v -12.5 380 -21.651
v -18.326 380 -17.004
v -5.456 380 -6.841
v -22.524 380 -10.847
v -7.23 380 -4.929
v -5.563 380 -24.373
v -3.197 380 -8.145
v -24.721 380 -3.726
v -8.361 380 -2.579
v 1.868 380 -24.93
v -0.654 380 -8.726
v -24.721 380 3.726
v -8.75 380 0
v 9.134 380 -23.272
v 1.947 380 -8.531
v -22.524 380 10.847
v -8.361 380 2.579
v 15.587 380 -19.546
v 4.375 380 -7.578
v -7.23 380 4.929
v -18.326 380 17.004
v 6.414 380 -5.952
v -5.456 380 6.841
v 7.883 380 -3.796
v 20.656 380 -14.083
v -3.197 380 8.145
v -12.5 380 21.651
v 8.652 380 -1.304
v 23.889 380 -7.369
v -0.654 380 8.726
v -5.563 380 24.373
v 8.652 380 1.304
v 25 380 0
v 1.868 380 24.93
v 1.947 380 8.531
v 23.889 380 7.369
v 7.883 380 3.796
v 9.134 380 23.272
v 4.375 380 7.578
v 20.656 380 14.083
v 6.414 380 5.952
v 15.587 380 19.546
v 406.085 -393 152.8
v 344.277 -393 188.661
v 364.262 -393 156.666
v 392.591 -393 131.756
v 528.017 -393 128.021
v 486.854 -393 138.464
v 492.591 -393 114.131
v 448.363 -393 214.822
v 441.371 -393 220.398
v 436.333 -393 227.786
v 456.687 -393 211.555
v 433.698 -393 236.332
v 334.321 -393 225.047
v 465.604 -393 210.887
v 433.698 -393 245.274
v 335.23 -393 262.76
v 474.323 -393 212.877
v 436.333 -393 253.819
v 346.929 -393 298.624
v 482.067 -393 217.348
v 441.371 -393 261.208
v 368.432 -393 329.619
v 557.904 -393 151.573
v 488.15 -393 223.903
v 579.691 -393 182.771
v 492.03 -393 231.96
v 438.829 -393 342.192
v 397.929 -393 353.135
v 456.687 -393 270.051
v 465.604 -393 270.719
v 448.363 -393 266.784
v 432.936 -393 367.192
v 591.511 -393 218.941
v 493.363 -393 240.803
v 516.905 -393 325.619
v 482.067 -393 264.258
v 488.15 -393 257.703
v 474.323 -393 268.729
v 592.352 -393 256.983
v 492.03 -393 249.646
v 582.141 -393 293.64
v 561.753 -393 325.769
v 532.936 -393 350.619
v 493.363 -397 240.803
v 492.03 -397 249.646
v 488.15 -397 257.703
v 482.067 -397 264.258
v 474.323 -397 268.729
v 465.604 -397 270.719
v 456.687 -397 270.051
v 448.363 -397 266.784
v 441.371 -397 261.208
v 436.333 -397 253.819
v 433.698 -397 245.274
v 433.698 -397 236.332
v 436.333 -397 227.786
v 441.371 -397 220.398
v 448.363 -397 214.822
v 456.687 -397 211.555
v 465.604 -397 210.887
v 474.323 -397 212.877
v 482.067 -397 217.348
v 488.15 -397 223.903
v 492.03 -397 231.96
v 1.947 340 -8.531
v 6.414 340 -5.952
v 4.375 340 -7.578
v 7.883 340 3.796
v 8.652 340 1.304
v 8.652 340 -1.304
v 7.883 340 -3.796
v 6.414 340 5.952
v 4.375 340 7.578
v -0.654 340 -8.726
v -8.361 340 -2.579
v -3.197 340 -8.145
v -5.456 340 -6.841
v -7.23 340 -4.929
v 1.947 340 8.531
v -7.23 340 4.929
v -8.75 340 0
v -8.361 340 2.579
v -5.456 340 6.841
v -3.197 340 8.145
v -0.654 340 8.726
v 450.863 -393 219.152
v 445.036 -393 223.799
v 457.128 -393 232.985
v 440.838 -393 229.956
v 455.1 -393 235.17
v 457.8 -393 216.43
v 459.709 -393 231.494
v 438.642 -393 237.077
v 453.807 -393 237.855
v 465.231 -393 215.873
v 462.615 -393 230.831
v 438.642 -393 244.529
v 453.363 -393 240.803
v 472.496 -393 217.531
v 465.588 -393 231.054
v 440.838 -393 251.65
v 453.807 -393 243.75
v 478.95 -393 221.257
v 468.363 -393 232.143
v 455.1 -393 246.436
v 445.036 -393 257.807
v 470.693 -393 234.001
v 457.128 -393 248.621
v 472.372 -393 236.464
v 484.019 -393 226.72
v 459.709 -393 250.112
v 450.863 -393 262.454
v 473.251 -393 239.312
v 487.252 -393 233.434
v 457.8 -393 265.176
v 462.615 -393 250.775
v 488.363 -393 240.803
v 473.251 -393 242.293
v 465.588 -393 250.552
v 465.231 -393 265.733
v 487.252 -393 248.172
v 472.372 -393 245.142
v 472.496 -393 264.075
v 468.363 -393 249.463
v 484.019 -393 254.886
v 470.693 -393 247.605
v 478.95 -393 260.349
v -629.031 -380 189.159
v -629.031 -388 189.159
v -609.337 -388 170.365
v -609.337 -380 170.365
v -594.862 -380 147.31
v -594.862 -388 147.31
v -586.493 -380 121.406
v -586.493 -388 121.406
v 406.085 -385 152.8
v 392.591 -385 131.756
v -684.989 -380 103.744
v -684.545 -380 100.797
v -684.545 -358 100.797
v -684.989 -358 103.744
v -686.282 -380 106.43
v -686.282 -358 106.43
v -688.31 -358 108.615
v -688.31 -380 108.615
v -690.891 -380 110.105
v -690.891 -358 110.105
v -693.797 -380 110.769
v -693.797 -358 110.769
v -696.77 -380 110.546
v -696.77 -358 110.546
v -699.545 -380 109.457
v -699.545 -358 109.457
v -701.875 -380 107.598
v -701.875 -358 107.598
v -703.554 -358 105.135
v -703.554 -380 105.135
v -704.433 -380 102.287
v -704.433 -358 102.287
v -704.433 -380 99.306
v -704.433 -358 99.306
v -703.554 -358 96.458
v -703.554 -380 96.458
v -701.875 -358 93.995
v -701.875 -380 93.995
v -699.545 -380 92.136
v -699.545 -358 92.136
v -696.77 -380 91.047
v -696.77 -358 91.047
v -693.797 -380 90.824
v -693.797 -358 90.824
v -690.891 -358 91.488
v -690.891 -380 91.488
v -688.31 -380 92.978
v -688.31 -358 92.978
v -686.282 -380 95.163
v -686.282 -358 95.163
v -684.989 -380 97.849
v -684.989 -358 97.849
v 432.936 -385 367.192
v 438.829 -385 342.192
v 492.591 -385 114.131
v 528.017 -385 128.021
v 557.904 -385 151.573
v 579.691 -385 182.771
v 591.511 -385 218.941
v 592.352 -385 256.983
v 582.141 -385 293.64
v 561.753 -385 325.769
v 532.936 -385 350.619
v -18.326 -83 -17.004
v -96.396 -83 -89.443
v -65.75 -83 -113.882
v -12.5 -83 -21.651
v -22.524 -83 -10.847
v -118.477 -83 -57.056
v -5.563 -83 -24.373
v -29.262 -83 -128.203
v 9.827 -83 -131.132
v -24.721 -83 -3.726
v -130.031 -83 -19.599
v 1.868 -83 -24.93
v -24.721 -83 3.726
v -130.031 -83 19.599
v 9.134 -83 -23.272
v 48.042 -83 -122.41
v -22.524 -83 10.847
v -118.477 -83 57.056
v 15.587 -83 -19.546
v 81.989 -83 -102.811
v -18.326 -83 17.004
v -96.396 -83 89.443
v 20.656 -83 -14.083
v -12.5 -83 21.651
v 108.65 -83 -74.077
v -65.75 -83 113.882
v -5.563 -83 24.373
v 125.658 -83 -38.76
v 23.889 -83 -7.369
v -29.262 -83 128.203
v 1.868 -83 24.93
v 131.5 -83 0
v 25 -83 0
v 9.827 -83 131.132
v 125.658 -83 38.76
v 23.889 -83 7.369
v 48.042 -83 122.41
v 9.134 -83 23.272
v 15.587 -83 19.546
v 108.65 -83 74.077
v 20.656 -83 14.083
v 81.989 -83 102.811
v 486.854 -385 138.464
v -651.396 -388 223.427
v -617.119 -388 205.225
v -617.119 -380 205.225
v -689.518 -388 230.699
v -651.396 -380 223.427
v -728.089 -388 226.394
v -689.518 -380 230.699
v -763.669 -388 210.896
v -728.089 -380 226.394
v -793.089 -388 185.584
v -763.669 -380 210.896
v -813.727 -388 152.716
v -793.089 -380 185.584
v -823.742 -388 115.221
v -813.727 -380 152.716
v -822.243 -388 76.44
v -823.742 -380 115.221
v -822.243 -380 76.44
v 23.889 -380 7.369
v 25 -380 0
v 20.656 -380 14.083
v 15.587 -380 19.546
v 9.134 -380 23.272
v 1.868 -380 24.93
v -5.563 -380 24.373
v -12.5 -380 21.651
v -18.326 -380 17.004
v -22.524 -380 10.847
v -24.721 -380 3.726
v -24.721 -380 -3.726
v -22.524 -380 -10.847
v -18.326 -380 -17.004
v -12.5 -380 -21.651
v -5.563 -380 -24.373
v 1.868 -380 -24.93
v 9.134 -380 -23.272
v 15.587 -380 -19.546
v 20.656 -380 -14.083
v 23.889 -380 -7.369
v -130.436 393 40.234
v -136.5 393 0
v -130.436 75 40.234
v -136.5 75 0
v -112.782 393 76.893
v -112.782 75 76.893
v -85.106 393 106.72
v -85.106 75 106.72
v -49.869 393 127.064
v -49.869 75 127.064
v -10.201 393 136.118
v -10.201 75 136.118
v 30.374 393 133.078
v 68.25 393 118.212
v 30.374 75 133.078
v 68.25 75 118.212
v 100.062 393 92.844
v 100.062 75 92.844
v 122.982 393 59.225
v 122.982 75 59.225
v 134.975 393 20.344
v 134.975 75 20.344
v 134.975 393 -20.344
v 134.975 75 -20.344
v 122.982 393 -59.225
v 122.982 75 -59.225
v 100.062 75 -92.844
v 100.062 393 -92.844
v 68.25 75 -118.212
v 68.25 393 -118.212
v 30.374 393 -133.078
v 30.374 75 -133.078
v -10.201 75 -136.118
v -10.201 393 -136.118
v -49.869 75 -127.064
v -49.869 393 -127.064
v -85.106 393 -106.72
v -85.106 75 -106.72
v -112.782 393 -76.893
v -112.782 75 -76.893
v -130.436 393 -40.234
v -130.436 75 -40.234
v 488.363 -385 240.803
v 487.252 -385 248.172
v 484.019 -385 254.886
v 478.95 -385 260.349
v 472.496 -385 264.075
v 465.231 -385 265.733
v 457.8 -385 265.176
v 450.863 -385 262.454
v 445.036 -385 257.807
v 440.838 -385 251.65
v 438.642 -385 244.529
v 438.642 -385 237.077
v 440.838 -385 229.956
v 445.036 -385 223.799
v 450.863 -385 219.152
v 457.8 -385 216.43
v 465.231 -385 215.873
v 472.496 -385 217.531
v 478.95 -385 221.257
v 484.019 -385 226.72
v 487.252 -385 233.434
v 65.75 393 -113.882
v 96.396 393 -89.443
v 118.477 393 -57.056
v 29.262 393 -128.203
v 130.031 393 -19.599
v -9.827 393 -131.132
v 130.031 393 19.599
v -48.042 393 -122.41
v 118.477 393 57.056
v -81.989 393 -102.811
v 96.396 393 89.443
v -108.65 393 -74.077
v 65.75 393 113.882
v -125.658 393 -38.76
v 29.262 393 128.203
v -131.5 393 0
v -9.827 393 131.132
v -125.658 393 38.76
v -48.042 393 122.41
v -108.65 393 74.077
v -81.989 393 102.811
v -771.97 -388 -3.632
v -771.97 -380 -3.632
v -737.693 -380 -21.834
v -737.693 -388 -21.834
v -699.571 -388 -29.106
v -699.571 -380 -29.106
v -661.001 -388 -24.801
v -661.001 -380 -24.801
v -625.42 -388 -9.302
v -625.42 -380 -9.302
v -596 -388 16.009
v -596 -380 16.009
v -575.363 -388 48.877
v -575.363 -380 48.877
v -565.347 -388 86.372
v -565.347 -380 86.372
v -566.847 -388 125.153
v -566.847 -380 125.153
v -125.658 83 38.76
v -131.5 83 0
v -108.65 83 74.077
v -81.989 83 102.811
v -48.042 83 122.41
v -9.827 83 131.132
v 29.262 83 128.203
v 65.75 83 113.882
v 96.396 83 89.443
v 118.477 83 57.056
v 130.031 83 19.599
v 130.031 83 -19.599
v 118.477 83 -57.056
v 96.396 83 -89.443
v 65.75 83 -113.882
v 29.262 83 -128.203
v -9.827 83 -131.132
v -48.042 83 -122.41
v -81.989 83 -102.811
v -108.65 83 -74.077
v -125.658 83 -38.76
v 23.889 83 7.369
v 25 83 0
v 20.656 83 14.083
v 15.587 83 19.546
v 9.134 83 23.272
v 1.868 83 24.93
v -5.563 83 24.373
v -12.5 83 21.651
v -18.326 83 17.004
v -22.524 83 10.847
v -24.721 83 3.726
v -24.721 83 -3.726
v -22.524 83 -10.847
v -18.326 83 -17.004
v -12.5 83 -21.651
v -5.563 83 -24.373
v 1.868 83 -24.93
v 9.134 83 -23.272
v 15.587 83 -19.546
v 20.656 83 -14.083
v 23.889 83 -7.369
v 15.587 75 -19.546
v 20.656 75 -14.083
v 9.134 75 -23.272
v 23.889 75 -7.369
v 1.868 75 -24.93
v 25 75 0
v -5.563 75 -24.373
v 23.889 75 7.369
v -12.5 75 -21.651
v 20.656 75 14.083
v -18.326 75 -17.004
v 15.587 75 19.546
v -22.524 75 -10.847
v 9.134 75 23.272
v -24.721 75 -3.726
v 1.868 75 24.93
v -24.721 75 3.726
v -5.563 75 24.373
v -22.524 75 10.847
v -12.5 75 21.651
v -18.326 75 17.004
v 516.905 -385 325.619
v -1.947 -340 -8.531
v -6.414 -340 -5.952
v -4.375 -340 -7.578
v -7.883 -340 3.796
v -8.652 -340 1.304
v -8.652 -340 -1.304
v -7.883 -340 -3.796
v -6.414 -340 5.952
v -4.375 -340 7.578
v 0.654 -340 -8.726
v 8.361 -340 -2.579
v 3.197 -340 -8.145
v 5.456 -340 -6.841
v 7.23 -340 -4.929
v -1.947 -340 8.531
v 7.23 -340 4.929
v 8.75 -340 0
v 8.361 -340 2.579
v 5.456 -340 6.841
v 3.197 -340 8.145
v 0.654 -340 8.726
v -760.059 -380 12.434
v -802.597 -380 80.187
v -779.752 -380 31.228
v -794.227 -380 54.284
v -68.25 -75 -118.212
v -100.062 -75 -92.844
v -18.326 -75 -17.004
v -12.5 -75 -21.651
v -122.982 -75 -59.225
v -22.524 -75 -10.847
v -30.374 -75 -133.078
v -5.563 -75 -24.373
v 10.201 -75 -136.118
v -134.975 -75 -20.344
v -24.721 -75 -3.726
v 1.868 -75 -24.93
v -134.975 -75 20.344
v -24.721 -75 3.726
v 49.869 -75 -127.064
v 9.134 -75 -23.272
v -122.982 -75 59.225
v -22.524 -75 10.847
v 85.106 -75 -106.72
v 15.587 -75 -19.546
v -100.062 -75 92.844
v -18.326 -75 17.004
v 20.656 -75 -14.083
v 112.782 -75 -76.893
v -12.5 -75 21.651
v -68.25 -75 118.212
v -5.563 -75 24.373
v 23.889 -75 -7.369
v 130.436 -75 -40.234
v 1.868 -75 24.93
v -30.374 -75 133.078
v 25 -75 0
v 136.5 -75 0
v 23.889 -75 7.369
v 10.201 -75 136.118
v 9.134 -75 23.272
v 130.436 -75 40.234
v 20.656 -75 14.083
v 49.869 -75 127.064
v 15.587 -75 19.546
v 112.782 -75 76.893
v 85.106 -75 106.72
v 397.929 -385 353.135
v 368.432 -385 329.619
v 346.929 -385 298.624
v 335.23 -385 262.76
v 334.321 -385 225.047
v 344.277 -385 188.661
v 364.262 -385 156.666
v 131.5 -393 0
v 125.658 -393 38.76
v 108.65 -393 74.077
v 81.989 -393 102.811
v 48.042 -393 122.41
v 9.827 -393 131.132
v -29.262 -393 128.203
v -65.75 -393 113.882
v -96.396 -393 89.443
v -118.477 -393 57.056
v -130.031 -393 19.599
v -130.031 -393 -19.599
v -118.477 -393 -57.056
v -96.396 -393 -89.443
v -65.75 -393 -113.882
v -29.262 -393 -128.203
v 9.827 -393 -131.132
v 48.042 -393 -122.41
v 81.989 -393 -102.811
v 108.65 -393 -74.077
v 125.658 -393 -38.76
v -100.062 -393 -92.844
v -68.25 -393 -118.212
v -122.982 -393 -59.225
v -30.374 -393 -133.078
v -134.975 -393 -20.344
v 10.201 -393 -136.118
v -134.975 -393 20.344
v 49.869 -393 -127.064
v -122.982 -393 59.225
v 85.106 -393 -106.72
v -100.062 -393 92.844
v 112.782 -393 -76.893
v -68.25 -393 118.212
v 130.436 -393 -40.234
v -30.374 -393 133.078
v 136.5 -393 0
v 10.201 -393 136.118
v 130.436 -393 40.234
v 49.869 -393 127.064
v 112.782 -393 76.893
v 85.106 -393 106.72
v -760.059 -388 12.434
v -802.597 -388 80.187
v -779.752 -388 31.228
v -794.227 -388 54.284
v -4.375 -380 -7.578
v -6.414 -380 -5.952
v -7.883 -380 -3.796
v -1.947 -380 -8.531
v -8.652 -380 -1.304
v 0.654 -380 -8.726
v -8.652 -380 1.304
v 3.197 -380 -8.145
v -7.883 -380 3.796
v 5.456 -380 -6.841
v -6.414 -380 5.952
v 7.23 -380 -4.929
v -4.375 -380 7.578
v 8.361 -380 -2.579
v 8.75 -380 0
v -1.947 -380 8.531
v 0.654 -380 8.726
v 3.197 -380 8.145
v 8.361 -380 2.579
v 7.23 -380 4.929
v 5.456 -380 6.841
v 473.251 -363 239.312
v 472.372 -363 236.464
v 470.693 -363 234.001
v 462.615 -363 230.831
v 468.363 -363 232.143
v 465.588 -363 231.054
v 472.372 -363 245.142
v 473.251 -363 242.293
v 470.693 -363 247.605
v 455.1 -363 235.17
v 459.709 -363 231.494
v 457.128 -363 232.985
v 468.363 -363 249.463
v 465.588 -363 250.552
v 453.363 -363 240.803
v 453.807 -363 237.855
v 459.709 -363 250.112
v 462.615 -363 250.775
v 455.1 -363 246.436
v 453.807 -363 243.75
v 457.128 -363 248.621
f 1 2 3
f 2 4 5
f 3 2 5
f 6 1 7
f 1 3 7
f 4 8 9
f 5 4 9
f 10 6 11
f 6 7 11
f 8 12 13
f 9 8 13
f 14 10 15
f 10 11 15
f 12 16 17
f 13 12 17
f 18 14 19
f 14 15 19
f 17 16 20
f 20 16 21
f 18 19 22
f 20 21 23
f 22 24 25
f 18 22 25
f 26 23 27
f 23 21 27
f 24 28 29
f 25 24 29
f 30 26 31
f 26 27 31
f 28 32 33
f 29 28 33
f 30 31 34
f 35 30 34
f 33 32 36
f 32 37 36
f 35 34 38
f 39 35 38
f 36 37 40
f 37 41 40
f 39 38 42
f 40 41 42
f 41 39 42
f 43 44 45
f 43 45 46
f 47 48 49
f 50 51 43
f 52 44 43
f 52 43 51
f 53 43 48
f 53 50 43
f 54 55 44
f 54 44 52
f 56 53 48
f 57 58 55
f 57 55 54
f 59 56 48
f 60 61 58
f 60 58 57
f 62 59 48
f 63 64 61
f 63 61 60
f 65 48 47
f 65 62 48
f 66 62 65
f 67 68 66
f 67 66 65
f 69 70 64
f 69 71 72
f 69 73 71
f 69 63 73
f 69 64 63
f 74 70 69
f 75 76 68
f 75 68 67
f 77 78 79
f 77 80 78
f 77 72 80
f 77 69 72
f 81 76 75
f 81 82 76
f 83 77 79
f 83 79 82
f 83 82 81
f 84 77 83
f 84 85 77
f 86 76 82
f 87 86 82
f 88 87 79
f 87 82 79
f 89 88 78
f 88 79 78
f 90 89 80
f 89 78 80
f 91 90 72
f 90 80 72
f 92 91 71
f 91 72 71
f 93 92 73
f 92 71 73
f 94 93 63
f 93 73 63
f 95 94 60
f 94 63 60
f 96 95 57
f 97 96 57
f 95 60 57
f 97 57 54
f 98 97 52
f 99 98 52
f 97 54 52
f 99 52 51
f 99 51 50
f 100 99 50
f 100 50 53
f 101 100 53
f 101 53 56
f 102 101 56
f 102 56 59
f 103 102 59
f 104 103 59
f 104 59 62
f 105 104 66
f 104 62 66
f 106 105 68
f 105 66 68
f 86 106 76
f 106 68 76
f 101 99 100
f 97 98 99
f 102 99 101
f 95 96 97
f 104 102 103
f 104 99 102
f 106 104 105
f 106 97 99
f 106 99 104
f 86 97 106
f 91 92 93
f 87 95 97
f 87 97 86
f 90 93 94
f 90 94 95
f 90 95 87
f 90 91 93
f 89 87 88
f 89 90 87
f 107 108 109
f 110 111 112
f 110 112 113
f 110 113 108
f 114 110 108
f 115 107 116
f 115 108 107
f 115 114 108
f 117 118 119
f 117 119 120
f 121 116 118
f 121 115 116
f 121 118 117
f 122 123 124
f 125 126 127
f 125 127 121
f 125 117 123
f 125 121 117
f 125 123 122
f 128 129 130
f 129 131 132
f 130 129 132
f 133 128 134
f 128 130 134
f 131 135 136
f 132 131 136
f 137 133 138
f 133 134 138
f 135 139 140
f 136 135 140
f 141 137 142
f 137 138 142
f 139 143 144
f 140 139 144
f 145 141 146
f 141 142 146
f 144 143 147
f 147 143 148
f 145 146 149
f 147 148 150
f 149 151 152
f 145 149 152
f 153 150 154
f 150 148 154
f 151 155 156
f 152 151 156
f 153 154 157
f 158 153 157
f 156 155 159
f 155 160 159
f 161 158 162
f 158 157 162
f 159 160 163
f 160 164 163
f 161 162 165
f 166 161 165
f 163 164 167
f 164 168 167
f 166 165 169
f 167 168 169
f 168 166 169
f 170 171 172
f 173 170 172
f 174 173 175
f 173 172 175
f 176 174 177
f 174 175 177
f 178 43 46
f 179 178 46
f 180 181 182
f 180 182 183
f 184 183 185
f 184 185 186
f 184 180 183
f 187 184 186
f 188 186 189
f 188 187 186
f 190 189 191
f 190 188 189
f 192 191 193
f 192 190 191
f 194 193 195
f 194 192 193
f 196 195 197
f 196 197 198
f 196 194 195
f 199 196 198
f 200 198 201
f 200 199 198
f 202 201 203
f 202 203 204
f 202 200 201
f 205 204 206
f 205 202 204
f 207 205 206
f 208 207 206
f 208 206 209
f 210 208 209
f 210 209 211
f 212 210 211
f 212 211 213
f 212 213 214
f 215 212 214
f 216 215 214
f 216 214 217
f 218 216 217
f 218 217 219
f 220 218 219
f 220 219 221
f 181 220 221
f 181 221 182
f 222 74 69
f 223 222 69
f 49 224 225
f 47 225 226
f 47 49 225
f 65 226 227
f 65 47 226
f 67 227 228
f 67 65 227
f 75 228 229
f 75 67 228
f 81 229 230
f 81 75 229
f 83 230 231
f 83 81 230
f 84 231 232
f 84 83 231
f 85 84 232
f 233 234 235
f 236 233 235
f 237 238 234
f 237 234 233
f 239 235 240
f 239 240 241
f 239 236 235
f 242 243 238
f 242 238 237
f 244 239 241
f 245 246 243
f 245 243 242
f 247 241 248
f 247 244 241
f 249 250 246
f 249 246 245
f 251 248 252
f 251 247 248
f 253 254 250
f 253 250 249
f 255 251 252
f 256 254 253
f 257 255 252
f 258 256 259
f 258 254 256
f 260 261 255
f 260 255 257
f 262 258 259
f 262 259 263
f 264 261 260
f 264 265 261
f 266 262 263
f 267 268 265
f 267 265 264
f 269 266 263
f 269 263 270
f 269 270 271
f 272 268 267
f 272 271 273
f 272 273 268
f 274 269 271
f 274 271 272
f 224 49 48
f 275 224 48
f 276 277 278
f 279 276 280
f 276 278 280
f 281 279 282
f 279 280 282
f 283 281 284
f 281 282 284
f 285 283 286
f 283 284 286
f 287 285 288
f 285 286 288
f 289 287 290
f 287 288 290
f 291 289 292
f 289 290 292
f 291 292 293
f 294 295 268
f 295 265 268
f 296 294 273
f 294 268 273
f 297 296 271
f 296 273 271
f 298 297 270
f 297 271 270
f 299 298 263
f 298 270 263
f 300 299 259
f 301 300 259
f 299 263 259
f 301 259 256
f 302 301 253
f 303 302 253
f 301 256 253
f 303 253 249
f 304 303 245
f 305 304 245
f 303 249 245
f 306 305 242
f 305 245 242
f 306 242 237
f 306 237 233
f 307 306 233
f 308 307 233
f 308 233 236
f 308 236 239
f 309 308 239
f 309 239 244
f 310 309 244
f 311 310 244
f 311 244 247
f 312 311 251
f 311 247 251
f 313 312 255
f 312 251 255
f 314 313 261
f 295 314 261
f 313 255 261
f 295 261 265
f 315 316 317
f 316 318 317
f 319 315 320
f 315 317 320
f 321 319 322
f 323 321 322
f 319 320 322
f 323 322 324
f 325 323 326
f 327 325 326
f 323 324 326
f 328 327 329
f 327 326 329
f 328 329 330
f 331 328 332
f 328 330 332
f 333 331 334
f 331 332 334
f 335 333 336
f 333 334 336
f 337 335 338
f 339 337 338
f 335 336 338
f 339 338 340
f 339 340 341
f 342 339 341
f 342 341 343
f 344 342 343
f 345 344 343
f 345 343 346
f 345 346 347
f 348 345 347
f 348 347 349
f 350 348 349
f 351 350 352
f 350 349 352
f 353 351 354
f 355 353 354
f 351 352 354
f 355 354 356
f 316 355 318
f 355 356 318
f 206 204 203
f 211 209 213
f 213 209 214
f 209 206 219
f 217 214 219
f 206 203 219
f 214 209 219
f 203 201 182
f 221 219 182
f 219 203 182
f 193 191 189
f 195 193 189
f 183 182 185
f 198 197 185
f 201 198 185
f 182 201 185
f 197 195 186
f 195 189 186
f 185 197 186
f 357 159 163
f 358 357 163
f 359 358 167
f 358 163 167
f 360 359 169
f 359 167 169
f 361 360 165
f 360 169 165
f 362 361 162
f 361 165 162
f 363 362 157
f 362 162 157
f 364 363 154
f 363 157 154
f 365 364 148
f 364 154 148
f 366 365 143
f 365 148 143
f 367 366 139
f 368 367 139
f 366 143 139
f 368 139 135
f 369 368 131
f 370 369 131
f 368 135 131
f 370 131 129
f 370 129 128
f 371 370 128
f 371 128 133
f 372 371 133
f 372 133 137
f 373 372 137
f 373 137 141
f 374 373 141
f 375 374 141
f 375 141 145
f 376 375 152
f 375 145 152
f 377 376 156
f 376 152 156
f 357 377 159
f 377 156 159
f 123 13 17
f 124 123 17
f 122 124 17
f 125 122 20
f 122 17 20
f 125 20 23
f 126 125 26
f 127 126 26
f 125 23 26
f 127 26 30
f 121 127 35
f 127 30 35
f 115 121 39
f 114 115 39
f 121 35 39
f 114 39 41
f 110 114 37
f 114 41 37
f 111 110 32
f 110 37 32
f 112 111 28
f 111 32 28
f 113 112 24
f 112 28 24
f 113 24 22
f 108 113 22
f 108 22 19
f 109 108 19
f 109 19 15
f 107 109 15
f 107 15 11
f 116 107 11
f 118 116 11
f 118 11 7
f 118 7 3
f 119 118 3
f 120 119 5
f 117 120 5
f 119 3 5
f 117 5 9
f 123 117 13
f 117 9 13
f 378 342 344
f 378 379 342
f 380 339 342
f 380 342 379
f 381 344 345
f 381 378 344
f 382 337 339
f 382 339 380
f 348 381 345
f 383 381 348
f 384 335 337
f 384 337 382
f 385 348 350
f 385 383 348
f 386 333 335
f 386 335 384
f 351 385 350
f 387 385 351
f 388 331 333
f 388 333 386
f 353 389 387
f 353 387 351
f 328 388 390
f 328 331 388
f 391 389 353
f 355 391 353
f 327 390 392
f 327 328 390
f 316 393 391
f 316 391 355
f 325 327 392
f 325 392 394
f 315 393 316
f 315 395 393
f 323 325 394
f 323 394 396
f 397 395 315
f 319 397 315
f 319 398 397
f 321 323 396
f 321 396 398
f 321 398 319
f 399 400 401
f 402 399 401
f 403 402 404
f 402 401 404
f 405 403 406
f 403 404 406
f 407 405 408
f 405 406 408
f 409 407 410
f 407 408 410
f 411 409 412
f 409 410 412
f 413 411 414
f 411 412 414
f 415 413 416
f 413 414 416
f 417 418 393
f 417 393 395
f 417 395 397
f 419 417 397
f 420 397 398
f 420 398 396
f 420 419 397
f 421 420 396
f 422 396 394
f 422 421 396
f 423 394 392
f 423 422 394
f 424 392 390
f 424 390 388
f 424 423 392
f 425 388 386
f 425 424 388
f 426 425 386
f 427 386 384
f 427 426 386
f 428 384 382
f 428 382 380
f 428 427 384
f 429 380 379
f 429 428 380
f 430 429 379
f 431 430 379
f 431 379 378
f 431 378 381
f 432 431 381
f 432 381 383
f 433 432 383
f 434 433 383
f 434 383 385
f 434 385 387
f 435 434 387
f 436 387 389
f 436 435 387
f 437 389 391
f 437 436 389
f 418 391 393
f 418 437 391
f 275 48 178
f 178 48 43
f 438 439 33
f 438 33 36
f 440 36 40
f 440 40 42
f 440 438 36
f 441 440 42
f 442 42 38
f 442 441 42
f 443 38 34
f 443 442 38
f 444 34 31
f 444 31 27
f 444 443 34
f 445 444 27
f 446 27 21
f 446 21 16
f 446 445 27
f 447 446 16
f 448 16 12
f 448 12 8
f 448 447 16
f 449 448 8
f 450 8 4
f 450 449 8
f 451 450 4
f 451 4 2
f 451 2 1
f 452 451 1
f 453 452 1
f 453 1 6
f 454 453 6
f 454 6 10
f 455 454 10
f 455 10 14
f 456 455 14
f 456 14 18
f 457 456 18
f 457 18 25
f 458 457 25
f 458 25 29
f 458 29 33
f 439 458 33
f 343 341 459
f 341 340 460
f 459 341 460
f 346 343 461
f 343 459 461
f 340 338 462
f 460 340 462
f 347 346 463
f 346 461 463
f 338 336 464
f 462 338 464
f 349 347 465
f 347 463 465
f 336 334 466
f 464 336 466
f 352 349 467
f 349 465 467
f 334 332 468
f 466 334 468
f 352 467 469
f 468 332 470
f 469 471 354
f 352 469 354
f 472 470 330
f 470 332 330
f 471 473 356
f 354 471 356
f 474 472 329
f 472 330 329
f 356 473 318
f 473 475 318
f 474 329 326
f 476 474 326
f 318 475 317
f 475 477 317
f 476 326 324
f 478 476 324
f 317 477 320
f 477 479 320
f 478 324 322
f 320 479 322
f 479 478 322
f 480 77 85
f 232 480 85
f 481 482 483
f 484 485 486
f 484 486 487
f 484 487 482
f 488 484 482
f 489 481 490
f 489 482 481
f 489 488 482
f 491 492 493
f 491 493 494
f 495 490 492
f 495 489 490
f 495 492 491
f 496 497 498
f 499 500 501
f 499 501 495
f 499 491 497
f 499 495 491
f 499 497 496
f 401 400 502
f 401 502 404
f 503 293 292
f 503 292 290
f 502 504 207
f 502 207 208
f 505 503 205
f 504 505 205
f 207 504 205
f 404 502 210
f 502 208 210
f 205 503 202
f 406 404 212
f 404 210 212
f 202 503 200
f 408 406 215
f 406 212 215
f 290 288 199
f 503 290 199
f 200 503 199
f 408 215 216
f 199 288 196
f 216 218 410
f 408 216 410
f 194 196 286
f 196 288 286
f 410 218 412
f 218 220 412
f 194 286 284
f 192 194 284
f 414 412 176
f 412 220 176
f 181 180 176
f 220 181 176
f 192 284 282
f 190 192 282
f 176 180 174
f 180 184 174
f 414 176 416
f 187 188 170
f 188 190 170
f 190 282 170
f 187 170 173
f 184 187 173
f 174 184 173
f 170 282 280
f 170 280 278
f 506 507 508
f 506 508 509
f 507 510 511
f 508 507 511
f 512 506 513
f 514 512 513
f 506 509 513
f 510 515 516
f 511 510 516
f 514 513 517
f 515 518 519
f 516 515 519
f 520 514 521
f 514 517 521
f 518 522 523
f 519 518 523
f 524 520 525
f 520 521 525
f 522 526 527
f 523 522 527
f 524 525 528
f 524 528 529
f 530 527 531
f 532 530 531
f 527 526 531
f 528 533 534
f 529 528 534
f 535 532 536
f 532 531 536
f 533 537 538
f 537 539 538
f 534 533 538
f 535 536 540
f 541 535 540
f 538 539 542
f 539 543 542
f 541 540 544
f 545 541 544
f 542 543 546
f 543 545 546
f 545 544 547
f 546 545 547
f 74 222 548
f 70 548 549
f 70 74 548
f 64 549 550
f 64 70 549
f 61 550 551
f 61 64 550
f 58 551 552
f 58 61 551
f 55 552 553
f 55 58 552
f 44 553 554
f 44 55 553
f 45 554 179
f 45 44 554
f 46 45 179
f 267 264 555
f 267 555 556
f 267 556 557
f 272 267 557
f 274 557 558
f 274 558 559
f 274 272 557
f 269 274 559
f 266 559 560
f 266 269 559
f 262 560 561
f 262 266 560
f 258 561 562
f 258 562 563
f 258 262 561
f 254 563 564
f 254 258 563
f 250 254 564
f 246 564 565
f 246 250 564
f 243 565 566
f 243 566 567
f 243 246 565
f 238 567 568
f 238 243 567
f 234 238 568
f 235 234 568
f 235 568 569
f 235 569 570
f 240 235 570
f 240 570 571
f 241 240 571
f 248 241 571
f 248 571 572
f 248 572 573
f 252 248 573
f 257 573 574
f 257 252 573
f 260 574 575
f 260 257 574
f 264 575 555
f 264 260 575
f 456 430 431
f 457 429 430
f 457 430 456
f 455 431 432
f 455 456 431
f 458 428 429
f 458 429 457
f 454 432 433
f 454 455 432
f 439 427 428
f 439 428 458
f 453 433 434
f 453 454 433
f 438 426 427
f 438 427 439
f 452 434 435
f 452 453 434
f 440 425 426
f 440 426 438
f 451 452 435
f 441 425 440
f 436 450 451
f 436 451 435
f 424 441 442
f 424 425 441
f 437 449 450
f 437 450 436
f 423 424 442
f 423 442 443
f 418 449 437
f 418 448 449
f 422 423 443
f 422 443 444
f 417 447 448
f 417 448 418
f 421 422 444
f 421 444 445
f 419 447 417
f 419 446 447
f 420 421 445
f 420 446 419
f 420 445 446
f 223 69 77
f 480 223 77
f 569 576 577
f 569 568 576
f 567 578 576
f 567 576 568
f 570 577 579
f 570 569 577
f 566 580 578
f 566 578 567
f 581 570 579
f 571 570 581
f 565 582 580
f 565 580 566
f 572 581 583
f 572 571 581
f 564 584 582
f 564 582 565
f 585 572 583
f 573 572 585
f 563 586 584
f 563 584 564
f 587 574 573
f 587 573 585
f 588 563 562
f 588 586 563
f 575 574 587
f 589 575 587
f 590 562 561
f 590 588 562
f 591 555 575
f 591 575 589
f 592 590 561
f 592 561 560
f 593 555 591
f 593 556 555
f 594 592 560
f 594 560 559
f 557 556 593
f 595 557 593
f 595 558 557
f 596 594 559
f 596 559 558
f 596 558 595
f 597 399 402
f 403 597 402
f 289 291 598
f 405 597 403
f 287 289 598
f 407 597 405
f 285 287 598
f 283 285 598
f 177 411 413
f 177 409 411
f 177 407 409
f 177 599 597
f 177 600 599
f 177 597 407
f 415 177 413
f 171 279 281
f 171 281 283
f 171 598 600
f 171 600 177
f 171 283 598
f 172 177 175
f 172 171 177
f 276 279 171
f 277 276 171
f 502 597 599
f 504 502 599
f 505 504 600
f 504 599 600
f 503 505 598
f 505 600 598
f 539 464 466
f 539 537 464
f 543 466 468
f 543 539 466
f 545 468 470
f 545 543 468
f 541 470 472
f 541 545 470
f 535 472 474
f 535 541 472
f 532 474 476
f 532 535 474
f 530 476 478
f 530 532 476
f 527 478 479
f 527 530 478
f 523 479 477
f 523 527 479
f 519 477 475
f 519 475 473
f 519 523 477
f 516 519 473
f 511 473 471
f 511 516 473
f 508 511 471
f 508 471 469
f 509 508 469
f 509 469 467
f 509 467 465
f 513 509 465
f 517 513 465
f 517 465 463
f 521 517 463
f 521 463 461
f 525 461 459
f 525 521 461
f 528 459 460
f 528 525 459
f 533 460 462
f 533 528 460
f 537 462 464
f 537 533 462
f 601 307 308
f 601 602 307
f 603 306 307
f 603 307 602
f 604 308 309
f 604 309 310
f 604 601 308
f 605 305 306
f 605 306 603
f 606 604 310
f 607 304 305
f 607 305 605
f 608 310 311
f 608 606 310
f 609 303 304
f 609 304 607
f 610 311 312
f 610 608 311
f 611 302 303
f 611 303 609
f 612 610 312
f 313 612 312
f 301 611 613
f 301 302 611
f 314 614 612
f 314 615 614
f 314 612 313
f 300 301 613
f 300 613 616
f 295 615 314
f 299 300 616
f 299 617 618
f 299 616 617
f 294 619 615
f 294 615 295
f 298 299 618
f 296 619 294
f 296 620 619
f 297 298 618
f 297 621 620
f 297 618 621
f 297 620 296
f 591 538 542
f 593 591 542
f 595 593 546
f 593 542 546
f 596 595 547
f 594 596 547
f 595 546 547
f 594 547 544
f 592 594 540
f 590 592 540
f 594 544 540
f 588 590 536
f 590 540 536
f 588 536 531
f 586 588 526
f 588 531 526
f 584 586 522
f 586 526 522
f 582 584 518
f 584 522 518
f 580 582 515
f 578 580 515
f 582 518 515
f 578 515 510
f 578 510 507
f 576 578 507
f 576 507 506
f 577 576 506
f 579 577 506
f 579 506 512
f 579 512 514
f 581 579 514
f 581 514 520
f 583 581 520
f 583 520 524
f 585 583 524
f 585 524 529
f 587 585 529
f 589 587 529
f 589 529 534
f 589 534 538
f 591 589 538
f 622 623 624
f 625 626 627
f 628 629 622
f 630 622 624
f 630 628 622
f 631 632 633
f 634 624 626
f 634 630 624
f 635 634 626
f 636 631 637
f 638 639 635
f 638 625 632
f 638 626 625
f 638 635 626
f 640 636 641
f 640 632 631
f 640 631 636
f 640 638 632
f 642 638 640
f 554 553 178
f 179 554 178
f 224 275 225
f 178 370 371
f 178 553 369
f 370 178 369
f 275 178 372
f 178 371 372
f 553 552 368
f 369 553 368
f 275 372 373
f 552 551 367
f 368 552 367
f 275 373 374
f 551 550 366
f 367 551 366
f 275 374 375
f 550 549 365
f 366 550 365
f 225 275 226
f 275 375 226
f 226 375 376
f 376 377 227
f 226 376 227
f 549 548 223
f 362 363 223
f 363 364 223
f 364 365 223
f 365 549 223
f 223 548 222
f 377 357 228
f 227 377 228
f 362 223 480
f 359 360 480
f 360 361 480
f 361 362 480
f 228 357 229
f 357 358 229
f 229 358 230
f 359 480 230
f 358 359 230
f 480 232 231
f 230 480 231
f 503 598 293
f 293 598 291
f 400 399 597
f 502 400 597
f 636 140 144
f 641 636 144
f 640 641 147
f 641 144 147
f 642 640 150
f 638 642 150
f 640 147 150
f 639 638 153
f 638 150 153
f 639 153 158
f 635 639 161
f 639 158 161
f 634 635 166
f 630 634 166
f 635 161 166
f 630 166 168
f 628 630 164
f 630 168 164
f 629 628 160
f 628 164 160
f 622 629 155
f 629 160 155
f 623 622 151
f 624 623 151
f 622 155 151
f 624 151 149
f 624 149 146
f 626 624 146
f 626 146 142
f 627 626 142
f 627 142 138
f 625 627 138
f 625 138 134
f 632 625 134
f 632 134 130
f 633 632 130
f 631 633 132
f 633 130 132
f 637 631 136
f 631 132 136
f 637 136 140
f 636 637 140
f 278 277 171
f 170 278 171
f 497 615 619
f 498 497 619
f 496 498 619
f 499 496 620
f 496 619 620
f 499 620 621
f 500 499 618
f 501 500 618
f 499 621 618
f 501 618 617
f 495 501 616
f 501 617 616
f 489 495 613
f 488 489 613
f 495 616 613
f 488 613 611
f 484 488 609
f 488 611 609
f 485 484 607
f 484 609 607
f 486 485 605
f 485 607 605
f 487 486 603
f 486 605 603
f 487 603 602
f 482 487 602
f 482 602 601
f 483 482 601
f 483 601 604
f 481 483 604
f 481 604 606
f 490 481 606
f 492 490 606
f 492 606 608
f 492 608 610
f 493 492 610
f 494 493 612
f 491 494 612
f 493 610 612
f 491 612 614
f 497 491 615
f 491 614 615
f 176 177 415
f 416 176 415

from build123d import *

# Parameters (mm, degrees)
F0_R      = 25
F1_DEPTH  = 75
F2_R      = 136.5
F3_DEPTH  = 8
F4_R      = 136.5
F4_R_2    = 131.5
F5_DEPTH  = 310
F6_DEPTH  = 380
F7_DEPTH  = 75
F8_R      = 136.5
F9_DEPTH  = 8
F10_R     = 136.5
F10_R_2   = 131.5
F11_DEPTH = 310
F12_DEPTH = 380
F13_R     = 8.75
F14_DEPTH = 40
F15_R     = 8.75
F16_DEPTH = 40
F17_R     = 130
F17_R_2   = 10
F18_DEPTH = 8
F20_DEPTH = 25
F21_R     = 10
F22_DEPTH = 30
F23_R     = 130
F23_R_2   = 25
F24_DEPTH = 8
F25_R     = 30
F26_DEPTH = 4
F27_R     = 10
F28_DEPTH = 30
F30_DEPTH = 25


with BuildPart() as f1:
    # F0 (on Front) → F1 (new body)
    with BuildSketch(Plane.XZ):
        Circle(F0_R)
    extrude(amount=F1_DEPTH)

    # F0 (on Front) → F6 (join)
    with BuildSketch(Plane.XZ):
        Circle(F0_R)
    extrude(amount=F6_DEPTH)



with BuildPart() as f3:
    # F2 (on face) → F3 (new body)
    with BuildSketch(Plane(origin=(0, 75, 0), x_dir=(-1, 0, 0), z_dir=(0, 1, 0))):
        Circle(F2_R)
    extrude(amount=F3_DEPTH)


with BuildPart() as f5:
    # F4 (on face) → F5 (new body)
    with BuildSketch(Plane.XZ.offset(83)):
        Circle(F4_R)
        Circle(F4_R_2, mode=Mode.SUBTRACT)
    extrude(amount=F5_DEPTH)


with BuildPart() as f1_1:
    add(f1.part)

    add(f3.part)  # F7 merges F3
    # F0 (on Front) → F7 (join)
    with BuildSketch(Plane.XZ):
        Circle(F0_R)
    extrude(amount=-F7_DEPTH)


    add(f5.part)  # F9 merges F5
    # F8 (on face) → F9 (join)
    with BuildSketch(Plane.XZ.offset(75)):
        Circle(F8_R)
    extrude(amount=F9_DEPTH)

    # F10 (on face) → F11 (join)
    with BuildSketch(Plane(origin=(0, 83, 0), x_dir=(-1, 0, 0), z_dir=(0, 1, 0))):
        Circle(F10_R)
        Circle(F10_R_2, mode=Mode.SUBTRACT)
    extrude(amount=F11_DEPTH)

    # F0 (on Front) → F12 (join)
    with BuildSketch(Plane.XZ):
        Circle(F0_R)
    extrude(amount=-F12_DEPTH)

    # F13 (on face) → F14 (cut)
    with BuildSketch(Plane.XZ.offset(380)):
        Circle(F13_R)
    extrude(amount=-F14_DEPTH, mode=Mode.SUBTRACT)

    # F15 (on face) → F16 (cut)
    with BuildSketch(Plane(origin=(0, 380, 0), x_dir=(-1, 0, 0), z_dir=(0, 1, 0))):
        Circle(F15_R)
    extrude(amount=-F16_DEPTH, mode=Mode.SUBTRACT)


with BuildPart() as f18:
    # F17 (on face) → F18 (new body)
    with BuildSketch(Plane.XZ.offset(380)):
        with Locations((-694.544673, 100.796528)):
            Circle(F17_R)
        with Locations((-694.544673, 100.796528)):
            Circle(F17_R_2, mode=Mode.SUBTRACT)
    extrude(amount=F18_DEPTH)

    # F19 (on face) → F20 (cut)
    with BuildSketch(Plane.XZ.offset(388)):
        with BuildLine():
            Line((-617.119133, 205.224904), (-629.030752, 189.158998))
            ThreePointArc((-629.030752, 189.158998), (-601.383963, 159.286546), (-586.492557, 121.405755))
            Line((-586.492557, 121.405755), (-566.846718, 125.152891))
            ThreePointArc((-566.846718, 125.152891), (-584.445654, 169.921098), (-617.119133, 205.224904))
        make_face()
        with BuildLine():
            ThreePointArc((-760.058561, 12.434033), (-787.70536, 42.306475), (-802.596781, 80.18726))
            Line((-802.596781, 80.18726), (-822.24262, 76.440124))
            ThreePointArc((-822.24262, 76.440124), (-804.643669, 31.671923), (-771.97018, -3.631873))
            Line((-771.97018, -3.631873), (-760.058561, 12.434033))
        make_face()
    extrude(amount=-F20_DEPTH, mode=Mode.SUBTRACT)

    # F21 (on face) → F22 (join)
    with BuildSketch(Plane.XZ.offset(388)):
        with Locations((-694.544673, 100.796528)):
            Circle(F21_R)
    extrude(amount=-F22_DEPTH)


with BuildPart() as f24:
    # F23 (on face) → F24 (new body)
    with BuildSketch(Plane.XZ.offset(393)):
        with Locations((463.362545, 240.802914)):
            Circle(F23_R)
        with Locations((463.362545, 240.802914)):
            Circle(F23_R_2, mode=Mode.SUBTRACT)
    extrude(amount=-F24_DEPTH)

    # F25 (on face) → F26 (join)
    with BuildSketch(Plane.XZ.offset(393)):
        with Locations((463.362545, 240.802914)):
            Circle(F25_R)
    extrude(amount=F26_DEPTH)

    # F27 (on face) → F28 (join)
    with BuildSketch(Plane(origin=(0, -393, 0), x_dir=(-1, 0, 0), z_dir=(0, 1, 0))):
        with Locations((-463.362545, 240.802914)):
            Circle(F27_R)
    extrude(amount=F28_DEPTH)

    # F29 (on face) → F30 (cut)
    with BuildSketch(Plane.XZ.offset(393)):
        with BuildLine():
            Line((406.085485, 152.800437), (392.590561, 131.755556))
            ThreePointArc((392.590561, 131.755556), (440.79864, 112.77608), (492.590561, 114.1312))
            Line((492.590561, 114.1312), (486.854449, 138.464244))
            Line((486.854449, 138.464244), (406.085485, 152.800437))
        make_face()
        with BuildLine():
            ThreePointArc((532.935667, 350.619036), (484.617498, 369.053555), (432.935667, 367.192016))
            Line((432.935667, 367.192016), (438.829003, 342.192016))
            Line((438.829003, 342.192016), (516.904543, 325.619036))
            Line((516.904543, 325.619036), (532.935667, 350.619036))
        make_face()
    extrude(amount=-F30_DEPTH, mode=Mode.SUBTRACT)


solid = Compound([f1_1.part, f18.part, f24.part])
